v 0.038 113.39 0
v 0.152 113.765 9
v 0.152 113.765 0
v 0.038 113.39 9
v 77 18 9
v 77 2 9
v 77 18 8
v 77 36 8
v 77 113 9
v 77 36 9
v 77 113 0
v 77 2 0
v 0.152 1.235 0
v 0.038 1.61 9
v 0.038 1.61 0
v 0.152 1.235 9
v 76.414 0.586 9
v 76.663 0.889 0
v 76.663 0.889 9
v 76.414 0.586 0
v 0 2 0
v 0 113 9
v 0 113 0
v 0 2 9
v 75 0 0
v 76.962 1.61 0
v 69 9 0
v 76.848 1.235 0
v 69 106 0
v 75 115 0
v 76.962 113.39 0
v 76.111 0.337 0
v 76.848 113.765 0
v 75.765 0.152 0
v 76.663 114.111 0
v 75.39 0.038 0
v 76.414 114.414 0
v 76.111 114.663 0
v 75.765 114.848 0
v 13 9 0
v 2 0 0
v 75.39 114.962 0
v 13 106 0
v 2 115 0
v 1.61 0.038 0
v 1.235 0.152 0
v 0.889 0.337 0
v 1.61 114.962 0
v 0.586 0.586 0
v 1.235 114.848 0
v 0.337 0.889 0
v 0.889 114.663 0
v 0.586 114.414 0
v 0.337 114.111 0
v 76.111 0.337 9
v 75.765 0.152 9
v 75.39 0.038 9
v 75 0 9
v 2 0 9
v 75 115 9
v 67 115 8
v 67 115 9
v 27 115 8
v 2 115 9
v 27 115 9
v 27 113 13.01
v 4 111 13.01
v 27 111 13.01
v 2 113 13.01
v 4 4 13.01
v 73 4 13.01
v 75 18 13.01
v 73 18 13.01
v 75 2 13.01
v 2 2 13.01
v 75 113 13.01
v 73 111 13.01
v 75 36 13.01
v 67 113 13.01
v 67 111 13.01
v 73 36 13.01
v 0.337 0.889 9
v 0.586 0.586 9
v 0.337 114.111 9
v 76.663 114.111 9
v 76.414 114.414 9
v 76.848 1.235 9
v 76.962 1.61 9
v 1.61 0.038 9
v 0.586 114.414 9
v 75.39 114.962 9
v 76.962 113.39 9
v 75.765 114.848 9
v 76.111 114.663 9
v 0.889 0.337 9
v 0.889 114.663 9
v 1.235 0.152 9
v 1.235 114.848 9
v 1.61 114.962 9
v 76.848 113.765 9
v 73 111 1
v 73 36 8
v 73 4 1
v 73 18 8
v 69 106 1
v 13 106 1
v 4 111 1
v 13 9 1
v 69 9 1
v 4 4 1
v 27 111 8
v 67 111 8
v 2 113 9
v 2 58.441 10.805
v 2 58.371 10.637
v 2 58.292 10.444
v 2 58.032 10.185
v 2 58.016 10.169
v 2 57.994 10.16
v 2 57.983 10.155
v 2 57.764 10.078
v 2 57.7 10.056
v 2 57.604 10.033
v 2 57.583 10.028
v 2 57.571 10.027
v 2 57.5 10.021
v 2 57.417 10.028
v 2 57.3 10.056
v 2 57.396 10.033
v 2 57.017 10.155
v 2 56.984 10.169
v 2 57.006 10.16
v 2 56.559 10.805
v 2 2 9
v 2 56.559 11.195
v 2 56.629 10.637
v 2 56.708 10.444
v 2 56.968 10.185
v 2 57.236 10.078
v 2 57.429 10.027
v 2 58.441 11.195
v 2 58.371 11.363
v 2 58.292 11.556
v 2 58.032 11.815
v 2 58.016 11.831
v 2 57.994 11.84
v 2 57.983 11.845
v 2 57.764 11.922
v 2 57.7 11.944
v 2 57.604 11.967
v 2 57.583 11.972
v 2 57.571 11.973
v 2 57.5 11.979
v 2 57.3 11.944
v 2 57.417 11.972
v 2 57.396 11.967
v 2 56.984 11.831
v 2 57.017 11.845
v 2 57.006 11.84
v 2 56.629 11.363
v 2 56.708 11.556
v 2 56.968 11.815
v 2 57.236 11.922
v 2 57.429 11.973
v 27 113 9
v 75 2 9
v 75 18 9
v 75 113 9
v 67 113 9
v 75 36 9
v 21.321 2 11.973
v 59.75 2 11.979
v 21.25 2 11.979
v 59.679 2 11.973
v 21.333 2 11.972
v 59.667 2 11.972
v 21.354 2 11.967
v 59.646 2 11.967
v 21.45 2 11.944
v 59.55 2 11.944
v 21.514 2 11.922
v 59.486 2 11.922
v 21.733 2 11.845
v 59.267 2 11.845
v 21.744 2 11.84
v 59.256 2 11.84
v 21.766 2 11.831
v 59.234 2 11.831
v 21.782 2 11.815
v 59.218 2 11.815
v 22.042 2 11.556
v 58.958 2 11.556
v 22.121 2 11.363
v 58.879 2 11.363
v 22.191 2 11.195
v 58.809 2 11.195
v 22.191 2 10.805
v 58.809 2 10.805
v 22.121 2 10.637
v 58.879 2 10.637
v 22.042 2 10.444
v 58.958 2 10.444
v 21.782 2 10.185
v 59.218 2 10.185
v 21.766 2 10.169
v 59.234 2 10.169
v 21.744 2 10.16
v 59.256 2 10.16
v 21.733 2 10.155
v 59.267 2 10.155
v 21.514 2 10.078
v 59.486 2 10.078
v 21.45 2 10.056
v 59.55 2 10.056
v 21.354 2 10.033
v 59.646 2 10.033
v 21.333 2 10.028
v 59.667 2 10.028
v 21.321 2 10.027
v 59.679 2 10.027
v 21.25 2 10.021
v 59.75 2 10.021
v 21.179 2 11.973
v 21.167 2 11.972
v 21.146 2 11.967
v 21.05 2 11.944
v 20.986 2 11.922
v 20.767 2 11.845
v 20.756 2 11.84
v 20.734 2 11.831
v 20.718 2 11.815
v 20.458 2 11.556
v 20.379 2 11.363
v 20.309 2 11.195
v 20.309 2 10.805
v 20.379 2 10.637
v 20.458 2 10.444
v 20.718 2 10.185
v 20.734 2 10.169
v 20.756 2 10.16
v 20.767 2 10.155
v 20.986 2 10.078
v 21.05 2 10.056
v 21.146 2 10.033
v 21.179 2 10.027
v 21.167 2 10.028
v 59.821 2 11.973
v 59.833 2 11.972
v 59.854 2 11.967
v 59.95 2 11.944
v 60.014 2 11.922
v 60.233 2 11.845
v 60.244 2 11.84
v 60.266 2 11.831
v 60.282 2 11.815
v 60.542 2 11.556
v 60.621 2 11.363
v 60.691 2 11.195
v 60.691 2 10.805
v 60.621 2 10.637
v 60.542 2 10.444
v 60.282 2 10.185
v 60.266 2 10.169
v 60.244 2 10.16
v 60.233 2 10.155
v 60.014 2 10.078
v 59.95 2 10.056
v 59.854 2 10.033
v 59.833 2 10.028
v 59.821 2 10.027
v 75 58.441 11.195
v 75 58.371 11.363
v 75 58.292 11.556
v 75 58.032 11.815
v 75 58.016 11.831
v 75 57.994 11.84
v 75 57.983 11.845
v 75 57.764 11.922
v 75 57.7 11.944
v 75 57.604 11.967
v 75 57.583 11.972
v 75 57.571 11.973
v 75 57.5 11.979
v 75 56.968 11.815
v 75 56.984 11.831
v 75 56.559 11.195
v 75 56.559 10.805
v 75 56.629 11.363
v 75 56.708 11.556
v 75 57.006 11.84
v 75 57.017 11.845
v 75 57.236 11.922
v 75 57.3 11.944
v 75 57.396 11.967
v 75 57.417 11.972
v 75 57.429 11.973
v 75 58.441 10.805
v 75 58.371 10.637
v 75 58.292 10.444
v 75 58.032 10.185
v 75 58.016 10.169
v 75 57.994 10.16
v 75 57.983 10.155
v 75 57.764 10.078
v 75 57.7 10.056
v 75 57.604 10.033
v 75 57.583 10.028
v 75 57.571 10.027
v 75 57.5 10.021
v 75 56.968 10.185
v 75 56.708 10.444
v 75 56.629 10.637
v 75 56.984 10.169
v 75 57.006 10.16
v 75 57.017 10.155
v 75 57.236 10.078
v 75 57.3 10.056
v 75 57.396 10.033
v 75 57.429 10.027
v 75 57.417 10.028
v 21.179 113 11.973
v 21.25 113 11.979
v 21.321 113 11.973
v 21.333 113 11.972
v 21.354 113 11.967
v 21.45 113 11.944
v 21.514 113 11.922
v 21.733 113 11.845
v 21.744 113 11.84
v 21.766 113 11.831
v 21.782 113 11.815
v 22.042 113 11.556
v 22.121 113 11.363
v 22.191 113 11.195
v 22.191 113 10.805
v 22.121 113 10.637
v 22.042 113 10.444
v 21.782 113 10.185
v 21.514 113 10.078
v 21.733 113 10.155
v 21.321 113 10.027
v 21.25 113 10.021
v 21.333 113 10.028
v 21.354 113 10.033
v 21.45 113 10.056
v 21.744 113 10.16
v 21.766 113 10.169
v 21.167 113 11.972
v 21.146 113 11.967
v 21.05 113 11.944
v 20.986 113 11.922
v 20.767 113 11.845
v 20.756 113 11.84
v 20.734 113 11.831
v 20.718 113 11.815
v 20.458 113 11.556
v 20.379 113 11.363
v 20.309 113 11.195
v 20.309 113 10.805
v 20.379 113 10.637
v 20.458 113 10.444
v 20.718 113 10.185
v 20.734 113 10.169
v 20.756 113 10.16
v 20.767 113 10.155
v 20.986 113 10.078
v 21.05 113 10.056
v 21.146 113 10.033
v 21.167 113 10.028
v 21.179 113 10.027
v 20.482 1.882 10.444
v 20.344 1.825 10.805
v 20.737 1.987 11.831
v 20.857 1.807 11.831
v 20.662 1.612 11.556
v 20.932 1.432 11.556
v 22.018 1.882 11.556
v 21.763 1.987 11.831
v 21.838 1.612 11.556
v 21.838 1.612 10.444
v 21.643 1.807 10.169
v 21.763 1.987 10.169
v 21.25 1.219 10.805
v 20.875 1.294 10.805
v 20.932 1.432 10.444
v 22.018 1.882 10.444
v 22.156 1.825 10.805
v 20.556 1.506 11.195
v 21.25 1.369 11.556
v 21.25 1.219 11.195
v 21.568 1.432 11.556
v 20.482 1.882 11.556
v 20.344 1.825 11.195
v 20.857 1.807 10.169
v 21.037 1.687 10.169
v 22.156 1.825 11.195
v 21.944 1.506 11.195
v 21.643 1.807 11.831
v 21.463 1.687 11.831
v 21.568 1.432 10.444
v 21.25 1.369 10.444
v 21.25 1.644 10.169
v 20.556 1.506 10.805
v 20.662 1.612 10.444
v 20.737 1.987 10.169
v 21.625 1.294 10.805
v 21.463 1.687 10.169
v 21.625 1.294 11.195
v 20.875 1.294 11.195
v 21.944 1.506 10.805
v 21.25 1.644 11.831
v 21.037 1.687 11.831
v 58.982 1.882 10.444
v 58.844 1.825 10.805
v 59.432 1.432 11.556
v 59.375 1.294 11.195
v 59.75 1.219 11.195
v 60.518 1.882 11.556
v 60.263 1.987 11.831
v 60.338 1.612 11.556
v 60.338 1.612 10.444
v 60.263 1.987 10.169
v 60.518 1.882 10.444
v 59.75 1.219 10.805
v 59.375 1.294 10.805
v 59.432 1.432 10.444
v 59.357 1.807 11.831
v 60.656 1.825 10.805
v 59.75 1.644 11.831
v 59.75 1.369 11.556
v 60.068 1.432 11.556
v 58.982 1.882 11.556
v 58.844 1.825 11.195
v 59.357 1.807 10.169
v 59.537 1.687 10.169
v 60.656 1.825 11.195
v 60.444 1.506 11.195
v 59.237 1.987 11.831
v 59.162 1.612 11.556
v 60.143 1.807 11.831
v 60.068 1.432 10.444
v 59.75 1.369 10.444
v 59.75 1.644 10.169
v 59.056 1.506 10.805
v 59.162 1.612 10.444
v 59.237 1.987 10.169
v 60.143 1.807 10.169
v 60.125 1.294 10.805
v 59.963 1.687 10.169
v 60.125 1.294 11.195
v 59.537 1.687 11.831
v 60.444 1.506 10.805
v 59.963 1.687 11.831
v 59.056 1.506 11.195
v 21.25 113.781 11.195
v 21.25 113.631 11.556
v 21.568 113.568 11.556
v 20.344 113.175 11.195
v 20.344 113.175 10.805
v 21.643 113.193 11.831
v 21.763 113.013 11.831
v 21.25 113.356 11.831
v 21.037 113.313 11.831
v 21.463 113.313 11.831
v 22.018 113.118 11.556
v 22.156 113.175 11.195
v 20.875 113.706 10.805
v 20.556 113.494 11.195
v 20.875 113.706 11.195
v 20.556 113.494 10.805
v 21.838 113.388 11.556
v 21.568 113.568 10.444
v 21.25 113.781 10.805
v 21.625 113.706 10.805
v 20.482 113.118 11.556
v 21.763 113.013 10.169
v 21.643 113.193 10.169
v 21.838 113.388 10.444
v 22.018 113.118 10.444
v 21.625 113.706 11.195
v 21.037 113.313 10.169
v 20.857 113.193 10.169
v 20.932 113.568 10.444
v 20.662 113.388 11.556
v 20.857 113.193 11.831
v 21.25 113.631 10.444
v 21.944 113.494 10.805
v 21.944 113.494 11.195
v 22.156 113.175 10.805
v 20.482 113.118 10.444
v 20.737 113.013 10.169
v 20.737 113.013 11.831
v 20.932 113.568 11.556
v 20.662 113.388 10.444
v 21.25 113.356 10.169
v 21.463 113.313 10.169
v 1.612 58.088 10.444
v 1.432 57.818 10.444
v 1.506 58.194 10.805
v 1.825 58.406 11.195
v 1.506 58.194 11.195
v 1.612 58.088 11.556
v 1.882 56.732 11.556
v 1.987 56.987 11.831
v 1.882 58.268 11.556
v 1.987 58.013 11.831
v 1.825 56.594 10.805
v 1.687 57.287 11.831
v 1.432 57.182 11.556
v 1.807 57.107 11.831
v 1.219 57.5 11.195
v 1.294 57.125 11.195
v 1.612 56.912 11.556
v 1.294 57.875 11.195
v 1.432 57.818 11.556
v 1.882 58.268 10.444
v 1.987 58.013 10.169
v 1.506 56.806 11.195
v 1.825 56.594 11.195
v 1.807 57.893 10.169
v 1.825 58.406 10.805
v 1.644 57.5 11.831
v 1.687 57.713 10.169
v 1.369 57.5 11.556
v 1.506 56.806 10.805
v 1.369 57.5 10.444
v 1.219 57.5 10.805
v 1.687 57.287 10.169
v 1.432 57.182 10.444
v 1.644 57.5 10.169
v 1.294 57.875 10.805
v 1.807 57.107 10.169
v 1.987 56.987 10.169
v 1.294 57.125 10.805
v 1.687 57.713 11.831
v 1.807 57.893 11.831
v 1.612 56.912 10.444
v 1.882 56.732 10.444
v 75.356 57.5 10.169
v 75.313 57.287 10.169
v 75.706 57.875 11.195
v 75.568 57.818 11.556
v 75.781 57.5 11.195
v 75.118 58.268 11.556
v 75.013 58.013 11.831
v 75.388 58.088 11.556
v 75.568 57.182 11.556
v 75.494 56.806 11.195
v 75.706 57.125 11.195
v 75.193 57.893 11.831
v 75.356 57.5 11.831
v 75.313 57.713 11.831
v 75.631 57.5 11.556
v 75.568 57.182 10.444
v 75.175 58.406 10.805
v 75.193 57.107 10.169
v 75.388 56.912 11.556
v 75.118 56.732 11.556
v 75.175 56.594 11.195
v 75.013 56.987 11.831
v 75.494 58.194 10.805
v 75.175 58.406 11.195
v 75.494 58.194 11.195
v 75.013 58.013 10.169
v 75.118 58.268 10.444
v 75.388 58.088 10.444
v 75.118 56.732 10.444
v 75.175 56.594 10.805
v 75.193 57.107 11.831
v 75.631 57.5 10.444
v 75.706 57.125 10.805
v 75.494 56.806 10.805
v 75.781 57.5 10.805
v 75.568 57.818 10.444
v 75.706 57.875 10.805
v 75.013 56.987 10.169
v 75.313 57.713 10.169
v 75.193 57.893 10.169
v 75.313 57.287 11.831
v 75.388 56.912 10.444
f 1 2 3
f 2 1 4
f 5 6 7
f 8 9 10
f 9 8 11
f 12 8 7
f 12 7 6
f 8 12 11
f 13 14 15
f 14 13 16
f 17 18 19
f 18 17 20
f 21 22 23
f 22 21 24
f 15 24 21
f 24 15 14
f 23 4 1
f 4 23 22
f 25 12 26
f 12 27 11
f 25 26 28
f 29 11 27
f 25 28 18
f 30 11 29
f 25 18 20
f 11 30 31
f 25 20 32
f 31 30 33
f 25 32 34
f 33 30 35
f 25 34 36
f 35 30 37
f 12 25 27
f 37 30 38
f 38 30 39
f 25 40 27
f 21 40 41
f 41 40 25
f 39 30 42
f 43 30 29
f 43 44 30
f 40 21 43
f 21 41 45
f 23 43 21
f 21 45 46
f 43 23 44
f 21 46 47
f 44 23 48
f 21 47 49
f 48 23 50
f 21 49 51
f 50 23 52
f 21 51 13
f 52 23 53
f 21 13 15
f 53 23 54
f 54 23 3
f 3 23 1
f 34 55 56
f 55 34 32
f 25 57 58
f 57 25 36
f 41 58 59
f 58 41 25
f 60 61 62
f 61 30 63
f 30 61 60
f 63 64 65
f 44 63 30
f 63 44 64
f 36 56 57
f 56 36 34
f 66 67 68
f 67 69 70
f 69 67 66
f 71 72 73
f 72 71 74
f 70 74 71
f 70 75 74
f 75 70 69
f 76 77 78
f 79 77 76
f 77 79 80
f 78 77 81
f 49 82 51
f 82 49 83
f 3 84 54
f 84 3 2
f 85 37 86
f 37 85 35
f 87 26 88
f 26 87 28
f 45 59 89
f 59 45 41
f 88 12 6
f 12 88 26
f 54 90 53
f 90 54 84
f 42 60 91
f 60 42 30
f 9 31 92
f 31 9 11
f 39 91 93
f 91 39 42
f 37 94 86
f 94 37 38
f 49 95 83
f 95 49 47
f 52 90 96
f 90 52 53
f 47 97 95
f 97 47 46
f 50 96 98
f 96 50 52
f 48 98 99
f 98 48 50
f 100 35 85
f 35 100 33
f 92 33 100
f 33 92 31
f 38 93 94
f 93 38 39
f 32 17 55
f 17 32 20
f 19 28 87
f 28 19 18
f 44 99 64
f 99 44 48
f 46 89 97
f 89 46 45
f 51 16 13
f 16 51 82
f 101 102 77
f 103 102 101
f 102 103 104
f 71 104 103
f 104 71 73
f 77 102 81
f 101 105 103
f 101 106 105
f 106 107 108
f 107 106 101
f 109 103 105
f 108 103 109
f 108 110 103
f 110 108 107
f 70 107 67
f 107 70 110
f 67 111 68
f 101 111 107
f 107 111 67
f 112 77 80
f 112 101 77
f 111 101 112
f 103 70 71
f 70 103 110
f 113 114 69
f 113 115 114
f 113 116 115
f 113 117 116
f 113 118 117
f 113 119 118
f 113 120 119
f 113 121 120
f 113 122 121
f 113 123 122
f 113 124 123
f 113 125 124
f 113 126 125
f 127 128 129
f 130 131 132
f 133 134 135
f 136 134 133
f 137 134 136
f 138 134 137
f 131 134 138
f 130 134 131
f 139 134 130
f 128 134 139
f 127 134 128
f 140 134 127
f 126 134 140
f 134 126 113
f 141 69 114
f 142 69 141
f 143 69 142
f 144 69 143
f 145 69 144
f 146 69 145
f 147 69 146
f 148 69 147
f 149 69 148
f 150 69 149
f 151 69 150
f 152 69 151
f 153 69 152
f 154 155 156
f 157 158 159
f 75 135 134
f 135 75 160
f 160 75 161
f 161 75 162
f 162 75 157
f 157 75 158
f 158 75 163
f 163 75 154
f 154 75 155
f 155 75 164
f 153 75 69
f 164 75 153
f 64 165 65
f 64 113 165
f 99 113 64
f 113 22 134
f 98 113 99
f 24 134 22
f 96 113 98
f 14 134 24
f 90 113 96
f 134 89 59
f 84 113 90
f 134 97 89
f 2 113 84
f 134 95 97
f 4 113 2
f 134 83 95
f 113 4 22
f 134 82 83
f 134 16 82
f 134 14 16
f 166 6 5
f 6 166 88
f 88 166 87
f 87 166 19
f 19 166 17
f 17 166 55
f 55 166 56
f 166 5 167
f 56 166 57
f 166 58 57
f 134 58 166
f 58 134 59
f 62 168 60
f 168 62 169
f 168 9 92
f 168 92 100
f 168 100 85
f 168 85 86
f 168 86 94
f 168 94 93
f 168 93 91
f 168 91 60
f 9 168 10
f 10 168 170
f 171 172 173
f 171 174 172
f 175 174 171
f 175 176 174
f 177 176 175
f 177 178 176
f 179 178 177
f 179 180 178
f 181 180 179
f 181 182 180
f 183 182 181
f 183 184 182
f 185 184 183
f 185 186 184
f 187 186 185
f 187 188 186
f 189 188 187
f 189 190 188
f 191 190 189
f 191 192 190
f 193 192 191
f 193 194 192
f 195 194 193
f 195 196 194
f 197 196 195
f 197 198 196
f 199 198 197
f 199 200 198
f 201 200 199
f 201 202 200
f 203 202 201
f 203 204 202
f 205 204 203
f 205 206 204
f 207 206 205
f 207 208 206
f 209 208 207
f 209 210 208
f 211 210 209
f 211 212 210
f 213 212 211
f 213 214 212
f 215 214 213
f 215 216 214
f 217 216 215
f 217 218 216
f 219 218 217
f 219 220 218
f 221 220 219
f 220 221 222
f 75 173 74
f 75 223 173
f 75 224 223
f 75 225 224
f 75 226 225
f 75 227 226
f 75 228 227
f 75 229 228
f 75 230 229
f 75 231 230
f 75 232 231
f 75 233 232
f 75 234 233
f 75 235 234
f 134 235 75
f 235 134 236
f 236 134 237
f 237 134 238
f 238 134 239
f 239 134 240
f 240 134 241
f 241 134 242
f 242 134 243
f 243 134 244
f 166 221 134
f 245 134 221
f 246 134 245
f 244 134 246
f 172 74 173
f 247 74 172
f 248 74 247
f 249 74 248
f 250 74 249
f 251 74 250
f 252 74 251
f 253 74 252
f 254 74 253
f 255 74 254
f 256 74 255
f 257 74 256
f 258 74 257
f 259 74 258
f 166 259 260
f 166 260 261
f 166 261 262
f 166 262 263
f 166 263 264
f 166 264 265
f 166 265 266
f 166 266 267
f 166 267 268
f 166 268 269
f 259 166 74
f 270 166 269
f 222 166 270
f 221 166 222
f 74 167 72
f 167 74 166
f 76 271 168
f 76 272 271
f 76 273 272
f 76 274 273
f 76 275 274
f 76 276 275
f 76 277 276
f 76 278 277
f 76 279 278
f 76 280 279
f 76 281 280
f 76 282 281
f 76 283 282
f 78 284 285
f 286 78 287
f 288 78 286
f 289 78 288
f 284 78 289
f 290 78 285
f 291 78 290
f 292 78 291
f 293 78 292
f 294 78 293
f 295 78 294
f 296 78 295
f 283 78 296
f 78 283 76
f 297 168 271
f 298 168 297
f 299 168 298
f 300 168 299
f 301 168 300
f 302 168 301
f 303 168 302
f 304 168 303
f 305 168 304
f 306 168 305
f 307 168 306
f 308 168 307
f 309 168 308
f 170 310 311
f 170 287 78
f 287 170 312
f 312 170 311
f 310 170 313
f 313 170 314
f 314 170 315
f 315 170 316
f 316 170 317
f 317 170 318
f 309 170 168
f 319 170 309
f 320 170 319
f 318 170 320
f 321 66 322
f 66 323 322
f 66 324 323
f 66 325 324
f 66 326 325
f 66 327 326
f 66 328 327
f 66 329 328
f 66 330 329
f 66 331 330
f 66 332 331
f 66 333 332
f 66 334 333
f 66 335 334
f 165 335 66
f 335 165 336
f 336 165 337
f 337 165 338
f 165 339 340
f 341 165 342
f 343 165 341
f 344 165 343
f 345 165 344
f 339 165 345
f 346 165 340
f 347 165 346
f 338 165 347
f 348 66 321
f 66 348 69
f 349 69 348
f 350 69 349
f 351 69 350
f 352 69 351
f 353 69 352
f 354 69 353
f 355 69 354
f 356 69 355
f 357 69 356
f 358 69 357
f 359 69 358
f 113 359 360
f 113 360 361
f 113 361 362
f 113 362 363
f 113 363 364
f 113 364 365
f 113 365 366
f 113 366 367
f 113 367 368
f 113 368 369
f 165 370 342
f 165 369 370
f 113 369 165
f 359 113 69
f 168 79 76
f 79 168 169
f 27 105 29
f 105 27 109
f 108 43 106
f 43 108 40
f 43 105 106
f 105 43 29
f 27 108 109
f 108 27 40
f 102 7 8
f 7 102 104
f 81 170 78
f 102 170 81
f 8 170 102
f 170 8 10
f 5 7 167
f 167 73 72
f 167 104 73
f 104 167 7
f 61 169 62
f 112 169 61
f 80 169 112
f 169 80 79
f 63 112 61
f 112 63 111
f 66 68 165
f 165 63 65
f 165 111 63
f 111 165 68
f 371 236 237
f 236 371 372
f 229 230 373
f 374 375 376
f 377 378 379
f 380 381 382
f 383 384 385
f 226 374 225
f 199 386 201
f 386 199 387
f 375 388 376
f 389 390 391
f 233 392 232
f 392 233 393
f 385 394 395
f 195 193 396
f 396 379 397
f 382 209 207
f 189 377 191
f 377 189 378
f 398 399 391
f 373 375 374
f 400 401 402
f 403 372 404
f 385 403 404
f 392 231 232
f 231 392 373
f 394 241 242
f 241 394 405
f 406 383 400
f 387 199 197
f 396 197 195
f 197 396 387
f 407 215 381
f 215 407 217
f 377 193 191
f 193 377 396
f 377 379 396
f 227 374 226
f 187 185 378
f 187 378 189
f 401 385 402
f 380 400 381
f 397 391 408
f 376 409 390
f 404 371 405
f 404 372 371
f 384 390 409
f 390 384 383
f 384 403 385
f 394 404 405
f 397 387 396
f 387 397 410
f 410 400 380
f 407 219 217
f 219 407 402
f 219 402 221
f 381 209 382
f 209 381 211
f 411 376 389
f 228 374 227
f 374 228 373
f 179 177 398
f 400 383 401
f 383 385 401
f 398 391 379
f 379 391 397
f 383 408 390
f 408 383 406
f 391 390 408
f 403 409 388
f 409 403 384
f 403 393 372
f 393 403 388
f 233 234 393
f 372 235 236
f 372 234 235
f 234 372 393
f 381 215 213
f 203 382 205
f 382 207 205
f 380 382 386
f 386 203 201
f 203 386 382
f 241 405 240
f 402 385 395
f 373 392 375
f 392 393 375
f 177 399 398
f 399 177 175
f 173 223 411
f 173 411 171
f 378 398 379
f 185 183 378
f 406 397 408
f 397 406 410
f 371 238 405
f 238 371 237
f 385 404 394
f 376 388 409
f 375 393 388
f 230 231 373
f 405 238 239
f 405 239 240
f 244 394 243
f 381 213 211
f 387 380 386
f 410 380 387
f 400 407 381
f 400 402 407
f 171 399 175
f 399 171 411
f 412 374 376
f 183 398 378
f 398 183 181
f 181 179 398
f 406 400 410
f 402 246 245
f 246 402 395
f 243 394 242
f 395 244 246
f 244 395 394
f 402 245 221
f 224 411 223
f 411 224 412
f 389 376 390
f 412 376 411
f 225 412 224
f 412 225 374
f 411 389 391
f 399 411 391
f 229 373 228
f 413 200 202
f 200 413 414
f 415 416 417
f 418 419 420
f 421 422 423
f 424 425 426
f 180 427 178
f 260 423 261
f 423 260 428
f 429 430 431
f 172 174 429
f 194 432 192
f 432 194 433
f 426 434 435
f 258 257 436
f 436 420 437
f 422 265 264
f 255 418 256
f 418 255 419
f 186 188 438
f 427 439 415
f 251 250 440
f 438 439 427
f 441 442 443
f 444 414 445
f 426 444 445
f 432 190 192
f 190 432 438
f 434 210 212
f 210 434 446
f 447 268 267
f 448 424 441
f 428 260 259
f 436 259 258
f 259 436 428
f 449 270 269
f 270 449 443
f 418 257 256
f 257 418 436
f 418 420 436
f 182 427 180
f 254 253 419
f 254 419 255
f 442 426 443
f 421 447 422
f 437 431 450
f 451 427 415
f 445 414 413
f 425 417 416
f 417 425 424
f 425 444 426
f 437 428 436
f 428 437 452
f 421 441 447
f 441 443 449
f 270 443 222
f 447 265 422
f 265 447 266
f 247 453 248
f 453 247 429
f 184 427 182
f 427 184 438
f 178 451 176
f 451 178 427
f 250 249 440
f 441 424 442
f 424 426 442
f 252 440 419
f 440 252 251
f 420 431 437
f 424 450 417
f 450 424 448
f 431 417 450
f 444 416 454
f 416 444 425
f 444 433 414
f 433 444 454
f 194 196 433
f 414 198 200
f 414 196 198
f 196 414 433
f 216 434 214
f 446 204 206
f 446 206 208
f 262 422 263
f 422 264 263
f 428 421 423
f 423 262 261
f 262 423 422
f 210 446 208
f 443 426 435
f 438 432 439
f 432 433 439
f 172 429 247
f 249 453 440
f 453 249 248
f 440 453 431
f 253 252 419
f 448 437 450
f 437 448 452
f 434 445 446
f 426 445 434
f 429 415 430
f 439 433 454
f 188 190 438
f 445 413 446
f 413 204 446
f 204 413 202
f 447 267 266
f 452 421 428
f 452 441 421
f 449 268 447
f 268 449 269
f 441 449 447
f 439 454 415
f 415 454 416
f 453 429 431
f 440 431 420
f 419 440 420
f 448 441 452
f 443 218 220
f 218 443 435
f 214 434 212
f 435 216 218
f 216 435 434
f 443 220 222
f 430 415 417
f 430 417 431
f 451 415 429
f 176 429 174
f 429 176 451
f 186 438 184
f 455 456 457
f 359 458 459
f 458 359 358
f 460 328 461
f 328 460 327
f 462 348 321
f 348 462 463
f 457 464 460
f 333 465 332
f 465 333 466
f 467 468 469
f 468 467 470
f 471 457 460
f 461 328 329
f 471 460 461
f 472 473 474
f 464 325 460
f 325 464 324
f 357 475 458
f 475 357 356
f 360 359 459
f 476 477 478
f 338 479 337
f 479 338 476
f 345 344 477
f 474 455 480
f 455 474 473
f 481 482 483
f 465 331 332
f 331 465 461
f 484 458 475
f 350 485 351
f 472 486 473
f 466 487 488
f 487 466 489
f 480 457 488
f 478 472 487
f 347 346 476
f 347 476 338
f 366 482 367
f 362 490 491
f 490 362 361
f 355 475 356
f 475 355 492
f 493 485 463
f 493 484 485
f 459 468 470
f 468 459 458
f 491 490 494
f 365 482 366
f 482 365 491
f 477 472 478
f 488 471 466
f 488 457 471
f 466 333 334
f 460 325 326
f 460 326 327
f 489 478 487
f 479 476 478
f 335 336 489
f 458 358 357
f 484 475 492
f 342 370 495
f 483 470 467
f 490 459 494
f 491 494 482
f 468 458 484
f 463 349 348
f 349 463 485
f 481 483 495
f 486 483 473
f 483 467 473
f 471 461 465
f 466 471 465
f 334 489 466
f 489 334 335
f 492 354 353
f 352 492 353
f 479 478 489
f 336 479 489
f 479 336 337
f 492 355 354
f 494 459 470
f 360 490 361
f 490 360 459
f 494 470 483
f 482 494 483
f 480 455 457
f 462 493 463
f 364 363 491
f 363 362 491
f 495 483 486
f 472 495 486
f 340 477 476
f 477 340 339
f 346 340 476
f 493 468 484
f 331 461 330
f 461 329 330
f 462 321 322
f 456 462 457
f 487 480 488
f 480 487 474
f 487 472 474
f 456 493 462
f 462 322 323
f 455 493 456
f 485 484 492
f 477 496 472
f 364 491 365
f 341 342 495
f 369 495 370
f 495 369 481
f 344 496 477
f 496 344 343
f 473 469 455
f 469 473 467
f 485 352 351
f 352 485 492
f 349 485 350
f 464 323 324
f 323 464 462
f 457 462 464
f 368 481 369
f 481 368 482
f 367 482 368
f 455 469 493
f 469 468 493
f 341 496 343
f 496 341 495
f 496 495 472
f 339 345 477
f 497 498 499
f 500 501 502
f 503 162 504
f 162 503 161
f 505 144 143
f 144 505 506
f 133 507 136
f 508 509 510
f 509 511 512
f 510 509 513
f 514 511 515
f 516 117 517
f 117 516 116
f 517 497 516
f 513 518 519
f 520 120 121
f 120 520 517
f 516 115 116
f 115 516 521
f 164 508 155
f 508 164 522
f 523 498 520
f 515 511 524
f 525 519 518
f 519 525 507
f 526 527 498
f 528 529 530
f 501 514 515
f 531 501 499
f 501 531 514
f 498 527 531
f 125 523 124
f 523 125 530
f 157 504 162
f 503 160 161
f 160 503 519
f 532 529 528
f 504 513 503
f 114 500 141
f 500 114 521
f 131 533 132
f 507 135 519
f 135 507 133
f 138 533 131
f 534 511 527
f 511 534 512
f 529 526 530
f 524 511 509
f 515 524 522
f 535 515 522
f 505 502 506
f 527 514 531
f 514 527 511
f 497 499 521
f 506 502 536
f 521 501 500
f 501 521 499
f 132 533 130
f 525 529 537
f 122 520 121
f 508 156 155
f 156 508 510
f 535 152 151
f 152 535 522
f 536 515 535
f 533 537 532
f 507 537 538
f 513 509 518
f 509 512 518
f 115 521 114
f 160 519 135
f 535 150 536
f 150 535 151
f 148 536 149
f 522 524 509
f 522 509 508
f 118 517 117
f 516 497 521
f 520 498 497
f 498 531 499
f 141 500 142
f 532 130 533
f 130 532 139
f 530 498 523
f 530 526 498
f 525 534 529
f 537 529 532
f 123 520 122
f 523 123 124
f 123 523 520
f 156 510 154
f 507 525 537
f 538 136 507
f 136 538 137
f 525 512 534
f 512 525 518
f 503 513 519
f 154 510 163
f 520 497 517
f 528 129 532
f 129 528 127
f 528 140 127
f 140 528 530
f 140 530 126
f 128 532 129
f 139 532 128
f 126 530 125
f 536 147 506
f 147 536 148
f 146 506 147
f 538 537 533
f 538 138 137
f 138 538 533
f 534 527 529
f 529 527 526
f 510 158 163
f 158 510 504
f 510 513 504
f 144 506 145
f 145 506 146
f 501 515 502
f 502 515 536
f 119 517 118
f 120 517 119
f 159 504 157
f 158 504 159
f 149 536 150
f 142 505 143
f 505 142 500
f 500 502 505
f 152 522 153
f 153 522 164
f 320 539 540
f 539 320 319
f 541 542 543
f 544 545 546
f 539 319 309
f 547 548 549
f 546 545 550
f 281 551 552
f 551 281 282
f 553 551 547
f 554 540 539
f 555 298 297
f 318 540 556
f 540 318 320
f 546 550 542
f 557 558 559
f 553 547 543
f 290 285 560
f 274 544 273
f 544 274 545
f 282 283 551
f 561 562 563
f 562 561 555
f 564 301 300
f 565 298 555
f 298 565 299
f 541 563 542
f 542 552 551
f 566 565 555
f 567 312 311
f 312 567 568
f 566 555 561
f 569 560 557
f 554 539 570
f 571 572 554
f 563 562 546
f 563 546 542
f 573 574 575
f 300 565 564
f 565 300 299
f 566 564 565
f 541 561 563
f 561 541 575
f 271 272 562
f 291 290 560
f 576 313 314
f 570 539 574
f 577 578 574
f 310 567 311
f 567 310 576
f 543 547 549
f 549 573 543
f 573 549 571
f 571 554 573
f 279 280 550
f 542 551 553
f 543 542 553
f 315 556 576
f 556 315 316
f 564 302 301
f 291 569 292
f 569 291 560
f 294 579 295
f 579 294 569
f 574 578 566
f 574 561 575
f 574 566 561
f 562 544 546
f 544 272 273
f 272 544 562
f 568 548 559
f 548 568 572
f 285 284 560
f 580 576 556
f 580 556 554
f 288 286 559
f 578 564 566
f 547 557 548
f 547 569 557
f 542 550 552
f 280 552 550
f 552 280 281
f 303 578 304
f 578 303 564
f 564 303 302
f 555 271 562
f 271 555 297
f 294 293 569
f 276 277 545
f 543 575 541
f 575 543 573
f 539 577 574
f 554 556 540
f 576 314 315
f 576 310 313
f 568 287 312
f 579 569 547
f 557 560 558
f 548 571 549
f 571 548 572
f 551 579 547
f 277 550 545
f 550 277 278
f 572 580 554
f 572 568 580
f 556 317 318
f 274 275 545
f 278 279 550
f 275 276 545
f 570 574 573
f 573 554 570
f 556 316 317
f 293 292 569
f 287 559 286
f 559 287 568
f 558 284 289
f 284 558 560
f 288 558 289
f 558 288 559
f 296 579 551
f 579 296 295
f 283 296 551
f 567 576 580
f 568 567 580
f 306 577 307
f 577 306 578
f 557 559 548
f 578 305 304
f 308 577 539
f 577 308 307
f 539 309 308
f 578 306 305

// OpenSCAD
// file: Boxes.scad
module roundedBox(length, width, height, radius)
{
	dRadius = 2 * radius;

	translate([ radius, radius, 0 ])
	{
		minkowski()
		{
			cube(size = [ width - dRadius, length - dRadius, height ]);
			cylinder(r = radius, h = 0.01);
		}
	}
}

module fullBox(length, width, height, radius, thickness, bottomThickness)
{
	difference()
	{
		roundedBox(length + thickness * 2, width + thickness * 2, height, radius);
		translate([ thickness, thickness, bottomThickness ])
		{
			roundedBox(length, width, height, radius);
		}
	}
}

module emptyBox(length, width, height, radius, thickness)
{
	difference()
	{
		roundedBox(length + thickness * 2, width + thickness * 2, height, radius);
		translate([ thickness, thickness, -1 ])
		{
			roundedBox(length, width, height + 2, radius);
		}
	}
}

module bottomBox(length, width, height1, height2, radius, thickness, bottomThickness)
{
	fullBox(length, width, height1, radius, thickness, bottomThickness);

	translate([ thickness / 2, thickness / 2, height1 ])
	{
		difference()
		{
			emptyBox(length, width, height2, radius, thickness / 2);

			translate([ width / 4 + thickness / 2, -0.2, height2 / 2 ])
			{
				sphere(1);
			}

			translate([ width / 4 * 3 + thickness / 2, -0.2, height2 / 2 ])
			{
				sphere(1);
			}

			translate([ width / 4 + thickness / 2, length + thickness + 0.2, height2 / 2 ])
			{
				sphere(1);
			}

			translate([ width / 4 * 3 + thickness / 2, length + thickness + 0.2, height2 / 2 ])
			{
				sphere(1);
			}
		}
	}
}
/**
 * Box with bottom
 *
 * @param length The box's length
 * @param width  The box's width
 */
module topBox(length, width, height1, height2, radius, thickness, bottomThickness)
{
	fullBox(length, width, height1, radius, thickness, bottomThickness);

	translate([ 0, 0, height1 ])
	{
		union()
		{
			emptyBox(length + thickness, width + thickness, height2, radius, thickness / 2);

			translate([ width / 4 + thickness / 2, thickness / 2 - 0.2, height2 / 2 ])
			{
				sphere(1);
			}

			translate([ width / 4 * 3 + thickness / 2, thickness / 2 - 0.2, height2 / 2 ])
			{
				sphere(1);
			}

			translate([ width / 4 + thickness / 2, length + thickness / 2 * 3 + 0.2, height2 / 2 ])
			{
				sphere(1);
			}

			translate([ width / 4 * 3 + thickness / 2, length + thickness / 2 * 3 + 0.2, height2 / 2 ])
			{
				sphere(1);
			}
		}
	}
}
// main file
include <Boxes.scad>

$fa = 1;
$fs = 0.4;

longueurCircuit = 107;
largeurCircuit = 69;

rayonCoin = 2;

hauteurBoite = 13;
hauteurCouvercle = 13;
epaisseurParoi = 4;
epaisseurFond = 1;

hauteurConnexion = 4;

longueurBoite = longueurCircuit + epaisseurParoi * 2;
largeurBoite = largeurCircuit + epaisseurParoi * 2;

module bottomWaveshare()
{
	union()
	{
		difference()
		{
			roundedBox(longueurBoite, largeurBoite, hauteurBoite, rayonCoin);

            // Ouvrir la boite
            //
			translate([ epaisseurParoi, epaisseurParoi, epaisseurFond ])
			{
				cube([ largeurBoite - 2 * epaisseurParoi, longueurBoite - 2 * epaisseurParoi, hauteurBoite ]);
			}

            // Carte SD
            //
			translate([ -0.1, 18, 8 ])
			{
				cube([ epaisseurParoi + 0.2, 18, 6.1 ]);
			}

            // Ports USB
            //
			translate([ 10, longueurBoite - epaisseurParoi - 0.1, epaisseurFond + 5 ])
			{
				cube([ 40, epaisseurParoi + 0.2, 7.1 ]);
			}

			// I2C
			//
			translate([ largeurBoite/2 - 5, - 0.1, epaisseurFond ])
			{
				cube([ 10, epaisseurParoi + 0.2, 6 ]);
			}

            // Connexion
            //
			translate([ epaisseurParoi / 2, epaisseurParoi / 2, hauteurBoite - hauteurConnexion + 0.1 ])
			{
				cube([ largeurBoite - epaisseurParoi, longueurBoite - epaisseurParoi, hauteurConnexion ]);
			}

            // Pressions
            //
			translate([
				largeurBoite / 4 + epaisseurParoi / 2, epaisseurParoi / 2 - 0.2, hauteurBoite - hauteurConnexion / 2
			])
			{
				sphere(1);
			}

			translate([
				largeurBoite / 4 * 3 + epaisseurParoi / 2, epaisseurParoi / 2 - 0.2, hauteurBoite - hauteurConnexion / 2
			])
			{
				sphere(1);
			}

			translate([
				largeurBoite / 4 + epaisseurParoi / 2, longueurBoite - epaisseurParoi / 2 + 0.2,
				hauteurBoite - hauteurConnexion / 2
			])
			{
				sphere(1);
			}

			translate([
				largeurBoite / 4 * 3 + epaisseurParoi / 2, longueurBoite - epaisseurParoi / 2 + 0.2,
				hauteurBoite - hauteurConnexion / 2
			])
			{
				sphere(1);
			}

			translate([ epaisseurParoi / 2 - 0.2, longueurBoite / 2 + 0.2, hauteurBoite - hauteurConnexion / 2 ])
			{
				sphere(1);
			}

			translate([
				largeurBoite - epaisseurParoi / 2 + 0.2, longueurBoite / 2 + 0.2, hauteurBoite - hauteurConnexion / 2
			])
			{
				sphere(1);
			}

		}
        // Supports
        //
		translate([ epaisseurParoi, epaisseurParoi, epaisseurFond ])
		{
			cube([ 7, 7, 7 ]);
		}
		translate([ largeurBoite - epaisseurParoi - 7, epaisseurParoi, epaisseurFond ])
		{
			cube([ 7, 7, 7 ]);
		}
		translate([ epaisseurParoi, longueurBoite - epaisseurParoi - 7, epaisseurFond ])
		{
			cube([ 7, 7, 7 ]);
		}
		translate([ largeurBoite - epaisseurParoi - 7, longueurBoite - epaisseurParoi - 7, epaisseurFond ])
		{
			cube([ 7, 7, 7 ]);
		}
    
	}
}

module topWaveshare()
{
	union()
	{
		difference()
		{
			roundedBox(longueurBoite, largeurBoite, hauteurCouvercle, rayonCoin);

            // Ouvrir le couvercle
            //
			translate([ epaisseurParoi, epaisseurParoi, epaisseurFond ])
			{
				cube([ largeurBoite - 2 * epaisseurParoi, longueurBoite - 2 * epaisseurParoi, hauteurCouvercle ]);
			}

            // Connexion
            //
			translate([ -0.1, 0, hauteurCouvercle - hauteurConnexion ])
			{
				cube([ epaisseurParoi/2+0.1, longueurBoite , hauteurConnexion+0.1 ]);
			}

			translate([ 0, -0.1, hauteurCouvercle - hauteurConnexion ])
			{
				cube([ largeurBoite, epaisseurParoi/2+0.1 , hauteurConnexion+0.1 ]);
			}

			translate([ largeurBoite-epaisseurParoi/2, 0, hauteurCouvercle - hauteurConnexion ])
			{
				cube([ epaisseurParoi/2+0.1, longueurBoite , hauteurConnexion+0.1 ]);
			}

			translate([ 0, longueurBoite-epaisseurParoi/2, hauteurCouvercle - hauteurConnexion ])
			{
				cube([ largeurBoite, epaisseurParoi/2+0.1 , hauteurConnexion+0.1 ]);
			}

            // Ecran
            //
   			translate([ epaisseurParoi+9, epaisseurParoi+5, -0.1 ])
			{
				cube([ 56, 97, epaisseurFond+0.2 ]);
			}

            // Carte SD
            //
			translate([ largeurBoite-epaisseurParoi-0.1, 18, hauteurCouvercle - 5 ])
			{
				cube([ epaisseurParoi + 0.2, 18, 5.1 ]);
			}

            // Ports USB
            //
			translate([ largeurBoite-50, longueurBoite - epaisseurParoi - 0.1, hauteurCouvercle - 5 ])
			{
				cube([ 40, epaisseurParoi + 0.2, 5.1 ]);
			}

		}

        // Pressions
        //
		translate([
			largeurBoite / 4 + epaisseurParoi / 2, epaisseurParoi / 2 + 0.2, hauteurCouvercle - hauteurConnexion / 2
		])
		{
			sphere(1);
		}

		translate([
			largeurBoite / 4 * 3 + epaisseurParoi / 2, epaisseurParoi / 2 + 0.2, hauteurCouvercle - hauteurConnexion / 2
		])
		{
			sphere(1);
		}

		translate([
			largeurBoite / 4 + epaisseurParoi / 2, longueurBoite - epaisseurParoi / 2 - 0.2,
			hauteurCouvercle - hauteurConnexion / 2
		])
		{
			sphere(1);
		}

        /*
		translate([
			largeurBoite / 4 * 3 + epaisseurParoi / 2, longueurBoite - epaisseurParoi / 2 - 0.2,
			hauteurCouvercle - hauteurConnexion / 2
		])
		{
			sphere(1);
		}
        */

		translate([ epaisseurParoi / 2 + 0.2, longueurBoite / 2, hauteurCouvercle - hauteurConnexion / 2 ])
		{
			sphere(1);
		}

		translate([
			largeurBoite - epaisseurParoi / 2 - 0.2, longueurBoite / 2, hauteurCouvercle - hauteurConnexion / 2
		])
		{
			sphere(1);
		}
	}
}
//translate([largeurCircuit+epaisseurParoi*2, 0,hauteurBoite*2-hauteurConnexion])
//    rotate([180,0,180])
        topWaveshare();
//bottomWaveshare();
